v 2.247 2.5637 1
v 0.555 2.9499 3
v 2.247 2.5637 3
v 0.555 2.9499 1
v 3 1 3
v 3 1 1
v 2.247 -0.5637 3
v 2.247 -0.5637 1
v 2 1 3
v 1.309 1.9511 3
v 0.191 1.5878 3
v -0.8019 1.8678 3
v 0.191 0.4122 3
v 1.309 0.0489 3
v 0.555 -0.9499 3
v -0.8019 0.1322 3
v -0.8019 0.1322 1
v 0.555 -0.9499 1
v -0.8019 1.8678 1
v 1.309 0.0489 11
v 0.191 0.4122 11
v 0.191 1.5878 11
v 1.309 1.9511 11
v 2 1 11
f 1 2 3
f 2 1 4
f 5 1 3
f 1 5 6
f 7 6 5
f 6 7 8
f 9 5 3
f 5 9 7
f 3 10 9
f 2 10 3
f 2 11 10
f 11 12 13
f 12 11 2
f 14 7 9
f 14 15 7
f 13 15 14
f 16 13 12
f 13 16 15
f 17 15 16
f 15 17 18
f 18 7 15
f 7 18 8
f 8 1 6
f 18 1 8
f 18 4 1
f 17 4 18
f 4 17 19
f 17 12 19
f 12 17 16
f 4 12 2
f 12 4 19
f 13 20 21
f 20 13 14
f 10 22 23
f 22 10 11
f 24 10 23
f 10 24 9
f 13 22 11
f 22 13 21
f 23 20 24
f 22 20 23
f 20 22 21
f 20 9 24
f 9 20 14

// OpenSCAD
difference(){
    translate([1,1,1]){
        cylinder(2,2,2);
        #cylinder(10,1,1);

    }
}
